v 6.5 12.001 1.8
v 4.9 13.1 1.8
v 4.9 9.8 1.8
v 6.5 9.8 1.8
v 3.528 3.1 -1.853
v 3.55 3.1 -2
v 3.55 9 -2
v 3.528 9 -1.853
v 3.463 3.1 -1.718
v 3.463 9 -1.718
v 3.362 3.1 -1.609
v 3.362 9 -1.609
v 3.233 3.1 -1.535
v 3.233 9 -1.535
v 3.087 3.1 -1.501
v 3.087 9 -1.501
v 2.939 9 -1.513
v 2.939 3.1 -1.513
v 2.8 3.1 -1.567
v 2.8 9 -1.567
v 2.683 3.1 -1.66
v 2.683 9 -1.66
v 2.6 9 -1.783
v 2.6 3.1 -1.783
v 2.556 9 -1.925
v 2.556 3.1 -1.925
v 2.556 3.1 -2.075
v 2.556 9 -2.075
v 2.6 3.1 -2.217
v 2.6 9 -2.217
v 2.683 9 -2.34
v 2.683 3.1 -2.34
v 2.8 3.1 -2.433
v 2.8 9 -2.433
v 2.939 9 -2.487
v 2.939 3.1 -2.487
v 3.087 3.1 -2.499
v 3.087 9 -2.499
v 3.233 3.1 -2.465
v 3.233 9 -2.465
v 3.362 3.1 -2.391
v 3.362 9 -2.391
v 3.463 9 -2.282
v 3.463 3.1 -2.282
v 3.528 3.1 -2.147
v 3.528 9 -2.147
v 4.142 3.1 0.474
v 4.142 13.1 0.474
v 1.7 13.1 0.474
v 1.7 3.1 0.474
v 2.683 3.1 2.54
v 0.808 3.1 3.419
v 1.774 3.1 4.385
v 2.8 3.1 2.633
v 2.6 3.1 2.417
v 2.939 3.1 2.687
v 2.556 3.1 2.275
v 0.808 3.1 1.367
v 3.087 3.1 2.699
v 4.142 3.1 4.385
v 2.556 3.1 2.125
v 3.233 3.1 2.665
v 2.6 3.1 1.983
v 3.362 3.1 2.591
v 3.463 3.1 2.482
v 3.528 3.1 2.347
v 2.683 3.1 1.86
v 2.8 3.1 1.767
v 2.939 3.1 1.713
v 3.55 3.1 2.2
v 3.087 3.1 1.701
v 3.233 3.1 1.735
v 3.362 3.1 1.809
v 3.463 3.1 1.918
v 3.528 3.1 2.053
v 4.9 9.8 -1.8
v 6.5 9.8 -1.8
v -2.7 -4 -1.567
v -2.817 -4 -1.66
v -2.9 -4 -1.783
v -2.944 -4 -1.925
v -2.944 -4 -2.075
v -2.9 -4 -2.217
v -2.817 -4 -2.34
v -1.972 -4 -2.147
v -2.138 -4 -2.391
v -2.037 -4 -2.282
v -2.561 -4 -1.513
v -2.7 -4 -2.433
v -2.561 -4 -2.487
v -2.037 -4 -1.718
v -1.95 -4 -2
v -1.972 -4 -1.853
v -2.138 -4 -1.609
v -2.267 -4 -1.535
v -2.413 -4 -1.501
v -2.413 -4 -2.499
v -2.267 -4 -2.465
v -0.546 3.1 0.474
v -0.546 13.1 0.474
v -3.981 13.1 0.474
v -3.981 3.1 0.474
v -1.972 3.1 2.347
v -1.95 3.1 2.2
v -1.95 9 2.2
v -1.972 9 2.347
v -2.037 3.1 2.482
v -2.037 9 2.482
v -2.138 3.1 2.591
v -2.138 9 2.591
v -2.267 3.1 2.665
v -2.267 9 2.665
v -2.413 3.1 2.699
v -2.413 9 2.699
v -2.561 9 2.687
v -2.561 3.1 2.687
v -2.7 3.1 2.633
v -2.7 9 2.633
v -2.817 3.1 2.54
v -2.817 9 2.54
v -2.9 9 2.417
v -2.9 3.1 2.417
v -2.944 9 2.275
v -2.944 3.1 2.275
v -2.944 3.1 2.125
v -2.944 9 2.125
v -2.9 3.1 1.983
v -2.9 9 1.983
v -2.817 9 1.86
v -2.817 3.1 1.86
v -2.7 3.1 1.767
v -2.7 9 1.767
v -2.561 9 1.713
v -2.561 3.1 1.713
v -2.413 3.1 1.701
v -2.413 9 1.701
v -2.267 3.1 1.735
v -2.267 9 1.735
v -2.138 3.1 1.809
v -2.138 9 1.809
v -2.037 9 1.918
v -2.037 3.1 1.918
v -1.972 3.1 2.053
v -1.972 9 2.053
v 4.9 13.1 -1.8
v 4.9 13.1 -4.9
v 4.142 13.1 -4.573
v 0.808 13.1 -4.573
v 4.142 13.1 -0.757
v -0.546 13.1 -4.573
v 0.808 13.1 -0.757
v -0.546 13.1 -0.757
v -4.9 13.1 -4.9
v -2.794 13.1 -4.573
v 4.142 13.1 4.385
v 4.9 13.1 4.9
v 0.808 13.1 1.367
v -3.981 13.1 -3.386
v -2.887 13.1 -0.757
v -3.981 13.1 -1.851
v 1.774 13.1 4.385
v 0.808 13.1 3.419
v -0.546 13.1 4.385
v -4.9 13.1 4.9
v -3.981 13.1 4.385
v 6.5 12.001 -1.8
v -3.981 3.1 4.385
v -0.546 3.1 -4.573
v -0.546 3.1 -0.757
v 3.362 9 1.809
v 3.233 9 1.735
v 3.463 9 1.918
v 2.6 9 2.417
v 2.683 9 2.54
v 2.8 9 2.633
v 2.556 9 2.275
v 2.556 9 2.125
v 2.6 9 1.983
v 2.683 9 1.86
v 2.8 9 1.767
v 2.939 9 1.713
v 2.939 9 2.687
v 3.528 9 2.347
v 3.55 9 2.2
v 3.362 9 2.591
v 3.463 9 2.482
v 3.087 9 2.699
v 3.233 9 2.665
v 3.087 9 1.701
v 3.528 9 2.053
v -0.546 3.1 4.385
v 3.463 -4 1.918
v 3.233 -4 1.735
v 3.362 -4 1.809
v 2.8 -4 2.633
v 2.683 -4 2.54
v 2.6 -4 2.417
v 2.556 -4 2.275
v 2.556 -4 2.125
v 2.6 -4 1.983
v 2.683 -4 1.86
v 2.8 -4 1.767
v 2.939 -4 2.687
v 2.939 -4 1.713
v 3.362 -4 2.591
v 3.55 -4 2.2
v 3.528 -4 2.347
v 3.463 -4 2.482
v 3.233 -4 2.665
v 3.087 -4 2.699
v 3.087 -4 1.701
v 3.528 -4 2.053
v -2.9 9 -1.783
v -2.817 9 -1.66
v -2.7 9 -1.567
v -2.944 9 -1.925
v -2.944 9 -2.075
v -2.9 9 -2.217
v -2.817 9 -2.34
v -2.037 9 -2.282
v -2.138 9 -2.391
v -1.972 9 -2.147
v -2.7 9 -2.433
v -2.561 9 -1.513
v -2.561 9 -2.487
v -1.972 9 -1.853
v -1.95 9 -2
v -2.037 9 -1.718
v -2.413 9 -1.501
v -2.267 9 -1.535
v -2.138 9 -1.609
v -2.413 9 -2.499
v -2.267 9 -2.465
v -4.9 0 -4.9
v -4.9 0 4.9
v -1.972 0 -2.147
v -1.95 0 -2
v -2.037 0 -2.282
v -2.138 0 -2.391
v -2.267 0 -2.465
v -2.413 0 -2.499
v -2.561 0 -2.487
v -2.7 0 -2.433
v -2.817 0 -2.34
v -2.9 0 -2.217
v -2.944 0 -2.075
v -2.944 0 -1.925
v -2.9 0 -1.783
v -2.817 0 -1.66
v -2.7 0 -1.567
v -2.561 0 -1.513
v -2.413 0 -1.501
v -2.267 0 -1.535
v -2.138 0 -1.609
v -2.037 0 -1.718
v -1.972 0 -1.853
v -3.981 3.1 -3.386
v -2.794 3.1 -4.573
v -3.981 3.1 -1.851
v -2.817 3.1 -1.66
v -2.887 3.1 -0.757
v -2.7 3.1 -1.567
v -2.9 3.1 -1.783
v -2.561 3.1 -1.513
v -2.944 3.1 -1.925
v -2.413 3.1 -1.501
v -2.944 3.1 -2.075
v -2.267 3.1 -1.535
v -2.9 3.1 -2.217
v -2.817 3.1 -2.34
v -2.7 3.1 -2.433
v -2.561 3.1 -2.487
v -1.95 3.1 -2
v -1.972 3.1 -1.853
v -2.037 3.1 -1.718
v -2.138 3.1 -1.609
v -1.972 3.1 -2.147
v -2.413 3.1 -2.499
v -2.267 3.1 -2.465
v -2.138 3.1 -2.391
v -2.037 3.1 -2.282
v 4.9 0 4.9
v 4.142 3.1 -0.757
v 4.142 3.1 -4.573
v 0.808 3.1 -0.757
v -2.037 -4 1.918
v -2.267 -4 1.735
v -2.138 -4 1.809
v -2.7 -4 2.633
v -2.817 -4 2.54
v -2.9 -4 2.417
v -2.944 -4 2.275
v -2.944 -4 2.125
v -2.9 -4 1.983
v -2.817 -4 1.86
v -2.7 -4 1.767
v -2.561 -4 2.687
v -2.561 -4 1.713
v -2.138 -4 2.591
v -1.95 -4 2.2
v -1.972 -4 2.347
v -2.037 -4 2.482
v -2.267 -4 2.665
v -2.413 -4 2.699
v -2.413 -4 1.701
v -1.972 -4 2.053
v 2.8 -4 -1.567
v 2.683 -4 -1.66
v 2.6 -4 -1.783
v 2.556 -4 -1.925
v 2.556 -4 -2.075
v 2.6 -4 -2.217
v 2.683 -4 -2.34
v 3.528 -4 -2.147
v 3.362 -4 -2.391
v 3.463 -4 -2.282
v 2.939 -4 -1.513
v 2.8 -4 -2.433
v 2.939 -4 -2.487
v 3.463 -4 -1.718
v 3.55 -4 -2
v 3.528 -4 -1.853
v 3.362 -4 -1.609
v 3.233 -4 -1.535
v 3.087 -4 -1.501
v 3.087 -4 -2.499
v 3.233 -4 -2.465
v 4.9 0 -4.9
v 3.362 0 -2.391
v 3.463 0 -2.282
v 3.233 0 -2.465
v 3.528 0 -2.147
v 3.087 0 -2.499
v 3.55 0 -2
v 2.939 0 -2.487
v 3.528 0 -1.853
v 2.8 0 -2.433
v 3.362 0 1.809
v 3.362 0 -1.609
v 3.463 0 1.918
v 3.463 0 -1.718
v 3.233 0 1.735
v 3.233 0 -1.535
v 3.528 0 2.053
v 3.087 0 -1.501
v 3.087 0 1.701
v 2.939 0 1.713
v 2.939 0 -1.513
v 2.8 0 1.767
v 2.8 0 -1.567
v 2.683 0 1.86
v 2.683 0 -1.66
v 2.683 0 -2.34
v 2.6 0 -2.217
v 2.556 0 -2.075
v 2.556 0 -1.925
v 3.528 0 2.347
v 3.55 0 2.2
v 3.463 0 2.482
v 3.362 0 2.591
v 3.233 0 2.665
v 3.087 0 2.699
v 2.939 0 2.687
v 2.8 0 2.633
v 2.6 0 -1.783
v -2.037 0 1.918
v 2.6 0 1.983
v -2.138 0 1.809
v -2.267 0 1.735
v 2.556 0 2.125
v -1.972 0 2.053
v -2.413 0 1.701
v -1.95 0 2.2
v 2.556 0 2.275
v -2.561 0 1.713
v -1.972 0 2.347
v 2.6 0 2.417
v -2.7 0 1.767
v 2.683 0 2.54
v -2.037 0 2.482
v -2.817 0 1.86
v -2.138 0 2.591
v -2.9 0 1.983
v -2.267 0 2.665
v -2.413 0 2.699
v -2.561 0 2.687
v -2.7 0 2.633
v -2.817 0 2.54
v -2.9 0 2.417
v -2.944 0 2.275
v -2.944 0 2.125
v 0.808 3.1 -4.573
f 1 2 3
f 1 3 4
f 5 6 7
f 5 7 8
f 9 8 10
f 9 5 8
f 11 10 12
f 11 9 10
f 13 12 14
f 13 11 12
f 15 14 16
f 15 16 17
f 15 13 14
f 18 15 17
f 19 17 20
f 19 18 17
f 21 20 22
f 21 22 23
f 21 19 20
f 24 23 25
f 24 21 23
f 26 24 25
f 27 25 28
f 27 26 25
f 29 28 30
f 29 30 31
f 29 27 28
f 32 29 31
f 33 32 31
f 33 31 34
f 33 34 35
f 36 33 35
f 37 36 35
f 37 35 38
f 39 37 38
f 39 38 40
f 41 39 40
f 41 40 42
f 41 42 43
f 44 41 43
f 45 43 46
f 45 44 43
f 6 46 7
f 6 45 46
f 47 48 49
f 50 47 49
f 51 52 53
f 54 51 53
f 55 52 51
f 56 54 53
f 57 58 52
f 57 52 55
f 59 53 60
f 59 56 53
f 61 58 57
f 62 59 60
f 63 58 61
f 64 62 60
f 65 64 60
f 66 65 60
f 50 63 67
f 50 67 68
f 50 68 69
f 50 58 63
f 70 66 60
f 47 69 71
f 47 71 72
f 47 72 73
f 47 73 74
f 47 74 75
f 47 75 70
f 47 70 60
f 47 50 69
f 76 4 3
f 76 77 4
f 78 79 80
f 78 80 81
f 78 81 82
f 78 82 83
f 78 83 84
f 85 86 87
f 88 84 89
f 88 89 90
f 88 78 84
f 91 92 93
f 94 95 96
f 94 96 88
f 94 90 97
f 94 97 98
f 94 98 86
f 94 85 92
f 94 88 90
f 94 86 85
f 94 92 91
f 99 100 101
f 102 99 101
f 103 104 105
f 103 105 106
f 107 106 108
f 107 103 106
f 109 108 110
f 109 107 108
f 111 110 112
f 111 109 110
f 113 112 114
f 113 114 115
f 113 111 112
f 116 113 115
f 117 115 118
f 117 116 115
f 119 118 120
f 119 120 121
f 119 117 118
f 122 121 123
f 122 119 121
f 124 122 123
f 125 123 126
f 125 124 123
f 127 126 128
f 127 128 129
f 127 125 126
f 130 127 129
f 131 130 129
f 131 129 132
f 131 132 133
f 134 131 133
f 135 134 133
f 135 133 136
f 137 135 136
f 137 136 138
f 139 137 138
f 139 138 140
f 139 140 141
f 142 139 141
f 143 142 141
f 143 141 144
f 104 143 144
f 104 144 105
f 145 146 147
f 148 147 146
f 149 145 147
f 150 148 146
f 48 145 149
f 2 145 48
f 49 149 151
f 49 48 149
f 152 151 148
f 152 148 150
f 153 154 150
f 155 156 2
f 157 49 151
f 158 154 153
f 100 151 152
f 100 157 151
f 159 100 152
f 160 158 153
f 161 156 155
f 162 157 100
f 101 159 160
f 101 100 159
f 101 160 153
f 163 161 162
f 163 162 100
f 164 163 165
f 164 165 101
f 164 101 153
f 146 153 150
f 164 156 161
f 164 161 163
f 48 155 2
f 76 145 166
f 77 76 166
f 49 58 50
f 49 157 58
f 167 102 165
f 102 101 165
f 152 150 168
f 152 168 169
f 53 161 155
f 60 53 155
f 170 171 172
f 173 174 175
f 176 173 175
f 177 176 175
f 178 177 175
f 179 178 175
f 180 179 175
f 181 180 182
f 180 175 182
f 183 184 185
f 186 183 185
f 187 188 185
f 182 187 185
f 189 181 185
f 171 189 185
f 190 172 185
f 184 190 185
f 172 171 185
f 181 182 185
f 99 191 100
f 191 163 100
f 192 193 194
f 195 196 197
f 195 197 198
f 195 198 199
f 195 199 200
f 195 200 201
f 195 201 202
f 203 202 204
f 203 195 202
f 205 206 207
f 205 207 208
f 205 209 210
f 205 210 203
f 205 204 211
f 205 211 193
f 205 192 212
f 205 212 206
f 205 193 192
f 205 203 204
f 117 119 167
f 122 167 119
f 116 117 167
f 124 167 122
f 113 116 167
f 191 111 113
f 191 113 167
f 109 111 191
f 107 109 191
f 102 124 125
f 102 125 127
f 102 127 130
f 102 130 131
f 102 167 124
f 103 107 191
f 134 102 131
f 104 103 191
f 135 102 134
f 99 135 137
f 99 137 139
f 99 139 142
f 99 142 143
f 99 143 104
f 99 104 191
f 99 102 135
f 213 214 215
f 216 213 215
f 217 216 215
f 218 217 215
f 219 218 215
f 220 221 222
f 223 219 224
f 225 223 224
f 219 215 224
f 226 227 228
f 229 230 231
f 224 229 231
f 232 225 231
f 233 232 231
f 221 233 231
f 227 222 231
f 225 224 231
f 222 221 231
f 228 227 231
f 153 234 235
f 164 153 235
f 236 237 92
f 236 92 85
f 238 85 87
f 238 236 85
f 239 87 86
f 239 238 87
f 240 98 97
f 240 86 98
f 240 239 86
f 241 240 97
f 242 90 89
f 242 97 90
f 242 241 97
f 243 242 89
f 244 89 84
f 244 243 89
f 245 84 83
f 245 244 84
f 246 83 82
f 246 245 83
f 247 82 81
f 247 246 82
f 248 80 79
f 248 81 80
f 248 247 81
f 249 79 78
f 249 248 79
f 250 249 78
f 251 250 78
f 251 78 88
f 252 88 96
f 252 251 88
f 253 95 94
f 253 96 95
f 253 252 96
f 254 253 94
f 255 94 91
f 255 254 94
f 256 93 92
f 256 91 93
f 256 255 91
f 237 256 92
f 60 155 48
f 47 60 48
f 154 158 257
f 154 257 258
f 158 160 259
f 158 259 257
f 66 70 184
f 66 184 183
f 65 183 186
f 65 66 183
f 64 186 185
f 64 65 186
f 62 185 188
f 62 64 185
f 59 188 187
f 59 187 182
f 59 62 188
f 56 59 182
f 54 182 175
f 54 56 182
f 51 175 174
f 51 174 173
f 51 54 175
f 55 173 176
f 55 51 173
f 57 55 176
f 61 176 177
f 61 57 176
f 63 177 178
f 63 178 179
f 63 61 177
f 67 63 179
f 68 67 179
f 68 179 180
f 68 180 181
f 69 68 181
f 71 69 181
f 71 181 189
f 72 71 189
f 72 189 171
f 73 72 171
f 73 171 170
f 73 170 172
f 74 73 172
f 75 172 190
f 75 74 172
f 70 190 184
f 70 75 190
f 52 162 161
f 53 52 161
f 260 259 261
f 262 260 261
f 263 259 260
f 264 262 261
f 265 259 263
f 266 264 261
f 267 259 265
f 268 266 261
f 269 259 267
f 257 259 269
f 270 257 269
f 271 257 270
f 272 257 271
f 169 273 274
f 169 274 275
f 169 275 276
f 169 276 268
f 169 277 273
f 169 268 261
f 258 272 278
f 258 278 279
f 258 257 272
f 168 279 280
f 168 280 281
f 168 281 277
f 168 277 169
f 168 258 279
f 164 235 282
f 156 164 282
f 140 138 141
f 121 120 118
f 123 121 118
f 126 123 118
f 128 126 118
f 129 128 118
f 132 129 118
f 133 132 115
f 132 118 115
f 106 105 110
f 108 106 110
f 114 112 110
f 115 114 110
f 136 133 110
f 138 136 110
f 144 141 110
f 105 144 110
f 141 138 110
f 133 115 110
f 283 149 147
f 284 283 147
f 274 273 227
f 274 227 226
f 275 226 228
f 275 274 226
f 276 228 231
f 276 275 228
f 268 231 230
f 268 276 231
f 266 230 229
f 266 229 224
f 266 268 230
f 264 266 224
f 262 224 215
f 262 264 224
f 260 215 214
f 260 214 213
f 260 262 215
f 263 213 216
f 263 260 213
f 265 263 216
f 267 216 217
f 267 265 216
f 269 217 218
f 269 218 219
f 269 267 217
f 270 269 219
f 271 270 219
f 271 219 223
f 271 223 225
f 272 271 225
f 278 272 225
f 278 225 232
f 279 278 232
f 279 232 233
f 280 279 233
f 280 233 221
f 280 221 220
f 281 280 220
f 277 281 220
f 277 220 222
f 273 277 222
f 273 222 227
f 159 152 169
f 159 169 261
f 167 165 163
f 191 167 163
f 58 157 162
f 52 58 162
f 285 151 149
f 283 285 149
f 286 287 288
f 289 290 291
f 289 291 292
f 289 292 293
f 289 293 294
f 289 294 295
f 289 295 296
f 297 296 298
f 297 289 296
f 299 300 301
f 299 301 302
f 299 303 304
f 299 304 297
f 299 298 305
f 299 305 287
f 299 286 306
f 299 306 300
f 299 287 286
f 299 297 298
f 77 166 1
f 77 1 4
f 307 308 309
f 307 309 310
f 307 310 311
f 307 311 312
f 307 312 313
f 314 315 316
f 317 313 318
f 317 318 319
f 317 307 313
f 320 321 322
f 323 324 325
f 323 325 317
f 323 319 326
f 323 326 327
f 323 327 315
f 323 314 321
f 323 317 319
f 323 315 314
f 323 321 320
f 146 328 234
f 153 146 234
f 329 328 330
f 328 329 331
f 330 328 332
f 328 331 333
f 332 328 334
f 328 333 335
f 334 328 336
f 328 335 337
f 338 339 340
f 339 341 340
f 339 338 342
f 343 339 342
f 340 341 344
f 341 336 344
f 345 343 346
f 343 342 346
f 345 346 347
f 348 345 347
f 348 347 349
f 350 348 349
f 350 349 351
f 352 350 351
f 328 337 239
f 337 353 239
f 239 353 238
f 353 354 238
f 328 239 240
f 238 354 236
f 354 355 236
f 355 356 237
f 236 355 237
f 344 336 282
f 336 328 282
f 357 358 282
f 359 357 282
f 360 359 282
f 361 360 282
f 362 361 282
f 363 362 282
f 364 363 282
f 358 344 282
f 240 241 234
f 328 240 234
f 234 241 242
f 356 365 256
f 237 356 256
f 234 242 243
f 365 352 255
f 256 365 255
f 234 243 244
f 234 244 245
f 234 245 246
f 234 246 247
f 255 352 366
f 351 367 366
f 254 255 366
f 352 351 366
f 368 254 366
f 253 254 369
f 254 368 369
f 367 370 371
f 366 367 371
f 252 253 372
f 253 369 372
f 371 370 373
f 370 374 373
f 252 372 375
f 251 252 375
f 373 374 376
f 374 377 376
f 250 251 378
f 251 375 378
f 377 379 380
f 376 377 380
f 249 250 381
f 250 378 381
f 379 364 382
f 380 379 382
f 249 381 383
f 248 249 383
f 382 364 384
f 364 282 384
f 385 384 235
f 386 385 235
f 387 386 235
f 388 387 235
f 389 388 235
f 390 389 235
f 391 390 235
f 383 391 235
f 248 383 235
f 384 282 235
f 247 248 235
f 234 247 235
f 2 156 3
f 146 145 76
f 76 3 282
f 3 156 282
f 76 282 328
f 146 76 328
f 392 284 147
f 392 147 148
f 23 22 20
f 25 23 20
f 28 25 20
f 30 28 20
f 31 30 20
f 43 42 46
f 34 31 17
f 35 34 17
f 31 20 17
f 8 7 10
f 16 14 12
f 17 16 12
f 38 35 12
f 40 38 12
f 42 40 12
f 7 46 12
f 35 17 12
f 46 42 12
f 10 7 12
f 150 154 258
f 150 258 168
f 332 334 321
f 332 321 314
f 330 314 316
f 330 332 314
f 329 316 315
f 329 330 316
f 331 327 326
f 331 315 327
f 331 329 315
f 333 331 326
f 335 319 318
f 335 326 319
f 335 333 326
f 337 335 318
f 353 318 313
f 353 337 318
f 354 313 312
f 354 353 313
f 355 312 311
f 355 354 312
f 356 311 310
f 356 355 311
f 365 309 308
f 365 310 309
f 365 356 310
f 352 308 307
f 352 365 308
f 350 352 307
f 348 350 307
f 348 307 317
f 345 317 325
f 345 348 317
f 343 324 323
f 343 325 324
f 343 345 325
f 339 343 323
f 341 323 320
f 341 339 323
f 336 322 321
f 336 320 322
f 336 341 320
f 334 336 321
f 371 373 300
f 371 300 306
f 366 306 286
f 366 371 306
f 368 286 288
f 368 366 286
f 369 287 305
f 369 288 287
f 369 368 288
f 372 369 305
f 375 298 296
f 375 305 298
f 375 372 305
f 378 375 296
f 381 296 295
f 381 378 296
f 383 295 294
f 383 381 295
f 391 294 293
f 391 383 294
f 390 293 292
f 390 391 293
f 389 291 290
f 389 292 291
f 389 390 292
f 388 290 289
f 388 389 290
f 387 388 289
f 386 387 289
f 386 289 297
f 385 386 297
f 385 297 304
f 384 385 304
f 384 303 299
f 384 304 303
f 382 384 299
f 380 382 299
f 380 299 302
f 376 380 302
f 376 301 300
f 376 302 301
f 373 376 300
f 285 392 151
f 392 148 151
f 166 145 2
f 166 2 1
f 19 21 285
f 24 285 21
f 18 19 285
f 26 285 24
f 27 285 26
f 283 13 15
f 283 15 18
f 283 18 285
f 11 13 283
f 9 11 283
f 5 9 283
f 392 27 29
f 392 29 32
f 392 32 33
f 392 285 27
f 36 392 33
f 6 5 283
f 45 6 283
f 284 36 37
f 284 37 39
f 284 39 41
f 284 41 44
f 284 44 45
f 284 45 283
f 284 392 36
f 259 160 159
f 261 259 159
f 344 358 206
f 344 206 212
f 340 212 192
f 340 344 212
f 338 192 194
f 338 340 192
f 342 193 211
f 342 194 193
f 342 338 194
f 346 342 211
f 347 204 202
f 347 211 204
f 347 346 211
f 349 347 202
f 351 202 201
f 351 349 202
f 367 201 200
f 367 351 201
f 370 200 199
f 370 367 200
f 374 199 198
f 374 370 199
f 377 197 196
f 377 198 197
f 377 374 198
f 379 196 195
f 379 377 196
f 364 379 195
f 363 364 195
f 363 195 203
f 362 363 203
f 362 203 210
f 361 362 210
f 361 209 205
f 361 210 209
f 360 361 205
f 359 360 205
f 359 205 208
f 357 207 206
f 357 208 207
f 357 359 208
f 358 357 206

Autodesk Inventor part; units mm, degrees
ref_plane "YZ Plane" through (0, 0, 0) normal (1, 0, 0) x (0, 1, 0)
ref_plane "XZ Plane" through (0, 0, 0) normal (0, 1, 0) x (-1, 0, 0)
ref_plane "XY Plane" through (0, 0, 0) normal (0, 0, 1) x (1, 0, 0)
sketch "Sketch1" plane through (0, 0, 0) normal (0, 1, 0) x (-1, 0, 0)
  line L0 (4.9, 4.9) -> (-4.9, 4.9)
  line L1 (-4.9, 4.9) -> (-4.9, -4.9)
  line L2 (-4.9, -4.9) -> (4.9, -4.9)
  line L3 (4.9, -4.9) -> (4.9, 4.9)
  point P0 (0, 0)
  dimension "d0" = 9.8
  dimension "d1" = 9.8
  dimension "d2" = 4.9
  dimension "d3" = 4.9
extrude "Extrusion1" add sketch "Sketch1" along normal blind 13.1
sketch "Sketch2" plane through (0, 0, 0) normal (0, 0, 1) x (1, 0, 0)
  line L0 (-4.9, 13.1) -> (4.9, 13.1) projected
  line L1 (4.9, 13.1) -> (6.5, 12.0007)
  line L2 (6.5, 12.0007) -> (6.5, 9.8)
  line L3 (6.5, 9.8) -> (4.9, 9.8)
  line L4 (4.9, 9.8) -> (4.9, 13.1)
  line L5 (4.9, 0) -> (4.9, 13.1) projected
  point P0 (0, 0)
  dimension "d6" = 3.3
  dimension "d7" = 1.6
extrude "Extrusion2" add sketch "Sketch2" along normal mid plane 3.6
sketch "Sketch3" plane through (0, 13.1, 0) normal (0, 1, 0) x (1, 0, 0)
  line L0 (-3.9809, -4.385) -> (-0.5456, -4.385)
  line L1 (-0.5456, -4.385) -> (-0.5456, -0.4741)
  line L2 (-0.5456, -0.4741) -> (-3.9809, -0.4741)
  line L3 (-3.9809, -0.4741) -> (-3.9809, -4.385)
  line L4 (0.8079, 0.7571) -> (4.1425, 0.7571)
  line L5 (4.1425, 0.7571) -> (4.1425, 4.5726)
  line L6 (4.1425, 4.5726) -> (0.8079, 4.5726)
  line L7 (0.8079, 4.5726) -> (0.8079, 0.7571)
  line L8 (-0.5456, 0.7571) -> (-3.9809, 0.7571)
  line L9 (-3.9809, 0.7571) -> (-3.9809, 4.5726)
  line L10 (-3.9809, 4.5726) -> (-0.5456, 4.5726)
  line L11 (-0.5456, 4.5726) -> (-0.5456, 0.7571)
  line L12 (0.8079, -4.385) -> (4.1425, -4.385)
  line L13 (4.1425, -4.385) -> (4.1425, -0.4741)
  line L14 (4.1425, -0.4741) -> (0.8079, -0.4741)
  line L15 (0.8079, -0.4741) -> (0.8079, -4.385)
  line L16 (-3.9809, 3.3862) -> (-2.7944, 4.5726)
  line L17 (-3.9809, 1.8506) -> (-2.8874, 0.7571)
  line L18 (0.8079, -3.4193) -> (1.7736, -4.385)
  line L19 (0.8079, -1.3667) -> (1.7005, -0.4741)
  point P0 (0, 0)
  dimension "d10" = 45
  dimension "d11" = 45
extrude "Extrusion3" cut sketch "Sketch3" against normal blind 10 contours L3 L2 L1 L0 | L7 L6 L5 L4 | L8 L17 L9 L16 L10 L11 | L18 L15 L19 L14 L13 L12
sketch "Sketch4" plane through (0, 0, 0) normal (0, -1, 0) x (1, 0, 0)
  circle A0 centre (3.05, 2.2) radius 0.5
  line L0 (4.9, 4.9) -> (4.9, -4.9) projected
  line L1 (-4.9, 4.9) -> (4.9, 4.9) projected
  point P0 (0, 0)
  dimension "d15" = 1
  dimension "d16" = 1.85
  dimension "d17" = 2.7
extrude "Extrusion4" add sketch "Sketch4" along normal blind 4 and the other way blind 9
pattern_linear "Rectangular Pattern1" count 2 spacing 4.2 along (0, 0, -1) count 2 spacing 5.5 along (-1, 0, 0) of "Extrusion4"
properties part number "Molex_MiniFitJR_4Pos"
